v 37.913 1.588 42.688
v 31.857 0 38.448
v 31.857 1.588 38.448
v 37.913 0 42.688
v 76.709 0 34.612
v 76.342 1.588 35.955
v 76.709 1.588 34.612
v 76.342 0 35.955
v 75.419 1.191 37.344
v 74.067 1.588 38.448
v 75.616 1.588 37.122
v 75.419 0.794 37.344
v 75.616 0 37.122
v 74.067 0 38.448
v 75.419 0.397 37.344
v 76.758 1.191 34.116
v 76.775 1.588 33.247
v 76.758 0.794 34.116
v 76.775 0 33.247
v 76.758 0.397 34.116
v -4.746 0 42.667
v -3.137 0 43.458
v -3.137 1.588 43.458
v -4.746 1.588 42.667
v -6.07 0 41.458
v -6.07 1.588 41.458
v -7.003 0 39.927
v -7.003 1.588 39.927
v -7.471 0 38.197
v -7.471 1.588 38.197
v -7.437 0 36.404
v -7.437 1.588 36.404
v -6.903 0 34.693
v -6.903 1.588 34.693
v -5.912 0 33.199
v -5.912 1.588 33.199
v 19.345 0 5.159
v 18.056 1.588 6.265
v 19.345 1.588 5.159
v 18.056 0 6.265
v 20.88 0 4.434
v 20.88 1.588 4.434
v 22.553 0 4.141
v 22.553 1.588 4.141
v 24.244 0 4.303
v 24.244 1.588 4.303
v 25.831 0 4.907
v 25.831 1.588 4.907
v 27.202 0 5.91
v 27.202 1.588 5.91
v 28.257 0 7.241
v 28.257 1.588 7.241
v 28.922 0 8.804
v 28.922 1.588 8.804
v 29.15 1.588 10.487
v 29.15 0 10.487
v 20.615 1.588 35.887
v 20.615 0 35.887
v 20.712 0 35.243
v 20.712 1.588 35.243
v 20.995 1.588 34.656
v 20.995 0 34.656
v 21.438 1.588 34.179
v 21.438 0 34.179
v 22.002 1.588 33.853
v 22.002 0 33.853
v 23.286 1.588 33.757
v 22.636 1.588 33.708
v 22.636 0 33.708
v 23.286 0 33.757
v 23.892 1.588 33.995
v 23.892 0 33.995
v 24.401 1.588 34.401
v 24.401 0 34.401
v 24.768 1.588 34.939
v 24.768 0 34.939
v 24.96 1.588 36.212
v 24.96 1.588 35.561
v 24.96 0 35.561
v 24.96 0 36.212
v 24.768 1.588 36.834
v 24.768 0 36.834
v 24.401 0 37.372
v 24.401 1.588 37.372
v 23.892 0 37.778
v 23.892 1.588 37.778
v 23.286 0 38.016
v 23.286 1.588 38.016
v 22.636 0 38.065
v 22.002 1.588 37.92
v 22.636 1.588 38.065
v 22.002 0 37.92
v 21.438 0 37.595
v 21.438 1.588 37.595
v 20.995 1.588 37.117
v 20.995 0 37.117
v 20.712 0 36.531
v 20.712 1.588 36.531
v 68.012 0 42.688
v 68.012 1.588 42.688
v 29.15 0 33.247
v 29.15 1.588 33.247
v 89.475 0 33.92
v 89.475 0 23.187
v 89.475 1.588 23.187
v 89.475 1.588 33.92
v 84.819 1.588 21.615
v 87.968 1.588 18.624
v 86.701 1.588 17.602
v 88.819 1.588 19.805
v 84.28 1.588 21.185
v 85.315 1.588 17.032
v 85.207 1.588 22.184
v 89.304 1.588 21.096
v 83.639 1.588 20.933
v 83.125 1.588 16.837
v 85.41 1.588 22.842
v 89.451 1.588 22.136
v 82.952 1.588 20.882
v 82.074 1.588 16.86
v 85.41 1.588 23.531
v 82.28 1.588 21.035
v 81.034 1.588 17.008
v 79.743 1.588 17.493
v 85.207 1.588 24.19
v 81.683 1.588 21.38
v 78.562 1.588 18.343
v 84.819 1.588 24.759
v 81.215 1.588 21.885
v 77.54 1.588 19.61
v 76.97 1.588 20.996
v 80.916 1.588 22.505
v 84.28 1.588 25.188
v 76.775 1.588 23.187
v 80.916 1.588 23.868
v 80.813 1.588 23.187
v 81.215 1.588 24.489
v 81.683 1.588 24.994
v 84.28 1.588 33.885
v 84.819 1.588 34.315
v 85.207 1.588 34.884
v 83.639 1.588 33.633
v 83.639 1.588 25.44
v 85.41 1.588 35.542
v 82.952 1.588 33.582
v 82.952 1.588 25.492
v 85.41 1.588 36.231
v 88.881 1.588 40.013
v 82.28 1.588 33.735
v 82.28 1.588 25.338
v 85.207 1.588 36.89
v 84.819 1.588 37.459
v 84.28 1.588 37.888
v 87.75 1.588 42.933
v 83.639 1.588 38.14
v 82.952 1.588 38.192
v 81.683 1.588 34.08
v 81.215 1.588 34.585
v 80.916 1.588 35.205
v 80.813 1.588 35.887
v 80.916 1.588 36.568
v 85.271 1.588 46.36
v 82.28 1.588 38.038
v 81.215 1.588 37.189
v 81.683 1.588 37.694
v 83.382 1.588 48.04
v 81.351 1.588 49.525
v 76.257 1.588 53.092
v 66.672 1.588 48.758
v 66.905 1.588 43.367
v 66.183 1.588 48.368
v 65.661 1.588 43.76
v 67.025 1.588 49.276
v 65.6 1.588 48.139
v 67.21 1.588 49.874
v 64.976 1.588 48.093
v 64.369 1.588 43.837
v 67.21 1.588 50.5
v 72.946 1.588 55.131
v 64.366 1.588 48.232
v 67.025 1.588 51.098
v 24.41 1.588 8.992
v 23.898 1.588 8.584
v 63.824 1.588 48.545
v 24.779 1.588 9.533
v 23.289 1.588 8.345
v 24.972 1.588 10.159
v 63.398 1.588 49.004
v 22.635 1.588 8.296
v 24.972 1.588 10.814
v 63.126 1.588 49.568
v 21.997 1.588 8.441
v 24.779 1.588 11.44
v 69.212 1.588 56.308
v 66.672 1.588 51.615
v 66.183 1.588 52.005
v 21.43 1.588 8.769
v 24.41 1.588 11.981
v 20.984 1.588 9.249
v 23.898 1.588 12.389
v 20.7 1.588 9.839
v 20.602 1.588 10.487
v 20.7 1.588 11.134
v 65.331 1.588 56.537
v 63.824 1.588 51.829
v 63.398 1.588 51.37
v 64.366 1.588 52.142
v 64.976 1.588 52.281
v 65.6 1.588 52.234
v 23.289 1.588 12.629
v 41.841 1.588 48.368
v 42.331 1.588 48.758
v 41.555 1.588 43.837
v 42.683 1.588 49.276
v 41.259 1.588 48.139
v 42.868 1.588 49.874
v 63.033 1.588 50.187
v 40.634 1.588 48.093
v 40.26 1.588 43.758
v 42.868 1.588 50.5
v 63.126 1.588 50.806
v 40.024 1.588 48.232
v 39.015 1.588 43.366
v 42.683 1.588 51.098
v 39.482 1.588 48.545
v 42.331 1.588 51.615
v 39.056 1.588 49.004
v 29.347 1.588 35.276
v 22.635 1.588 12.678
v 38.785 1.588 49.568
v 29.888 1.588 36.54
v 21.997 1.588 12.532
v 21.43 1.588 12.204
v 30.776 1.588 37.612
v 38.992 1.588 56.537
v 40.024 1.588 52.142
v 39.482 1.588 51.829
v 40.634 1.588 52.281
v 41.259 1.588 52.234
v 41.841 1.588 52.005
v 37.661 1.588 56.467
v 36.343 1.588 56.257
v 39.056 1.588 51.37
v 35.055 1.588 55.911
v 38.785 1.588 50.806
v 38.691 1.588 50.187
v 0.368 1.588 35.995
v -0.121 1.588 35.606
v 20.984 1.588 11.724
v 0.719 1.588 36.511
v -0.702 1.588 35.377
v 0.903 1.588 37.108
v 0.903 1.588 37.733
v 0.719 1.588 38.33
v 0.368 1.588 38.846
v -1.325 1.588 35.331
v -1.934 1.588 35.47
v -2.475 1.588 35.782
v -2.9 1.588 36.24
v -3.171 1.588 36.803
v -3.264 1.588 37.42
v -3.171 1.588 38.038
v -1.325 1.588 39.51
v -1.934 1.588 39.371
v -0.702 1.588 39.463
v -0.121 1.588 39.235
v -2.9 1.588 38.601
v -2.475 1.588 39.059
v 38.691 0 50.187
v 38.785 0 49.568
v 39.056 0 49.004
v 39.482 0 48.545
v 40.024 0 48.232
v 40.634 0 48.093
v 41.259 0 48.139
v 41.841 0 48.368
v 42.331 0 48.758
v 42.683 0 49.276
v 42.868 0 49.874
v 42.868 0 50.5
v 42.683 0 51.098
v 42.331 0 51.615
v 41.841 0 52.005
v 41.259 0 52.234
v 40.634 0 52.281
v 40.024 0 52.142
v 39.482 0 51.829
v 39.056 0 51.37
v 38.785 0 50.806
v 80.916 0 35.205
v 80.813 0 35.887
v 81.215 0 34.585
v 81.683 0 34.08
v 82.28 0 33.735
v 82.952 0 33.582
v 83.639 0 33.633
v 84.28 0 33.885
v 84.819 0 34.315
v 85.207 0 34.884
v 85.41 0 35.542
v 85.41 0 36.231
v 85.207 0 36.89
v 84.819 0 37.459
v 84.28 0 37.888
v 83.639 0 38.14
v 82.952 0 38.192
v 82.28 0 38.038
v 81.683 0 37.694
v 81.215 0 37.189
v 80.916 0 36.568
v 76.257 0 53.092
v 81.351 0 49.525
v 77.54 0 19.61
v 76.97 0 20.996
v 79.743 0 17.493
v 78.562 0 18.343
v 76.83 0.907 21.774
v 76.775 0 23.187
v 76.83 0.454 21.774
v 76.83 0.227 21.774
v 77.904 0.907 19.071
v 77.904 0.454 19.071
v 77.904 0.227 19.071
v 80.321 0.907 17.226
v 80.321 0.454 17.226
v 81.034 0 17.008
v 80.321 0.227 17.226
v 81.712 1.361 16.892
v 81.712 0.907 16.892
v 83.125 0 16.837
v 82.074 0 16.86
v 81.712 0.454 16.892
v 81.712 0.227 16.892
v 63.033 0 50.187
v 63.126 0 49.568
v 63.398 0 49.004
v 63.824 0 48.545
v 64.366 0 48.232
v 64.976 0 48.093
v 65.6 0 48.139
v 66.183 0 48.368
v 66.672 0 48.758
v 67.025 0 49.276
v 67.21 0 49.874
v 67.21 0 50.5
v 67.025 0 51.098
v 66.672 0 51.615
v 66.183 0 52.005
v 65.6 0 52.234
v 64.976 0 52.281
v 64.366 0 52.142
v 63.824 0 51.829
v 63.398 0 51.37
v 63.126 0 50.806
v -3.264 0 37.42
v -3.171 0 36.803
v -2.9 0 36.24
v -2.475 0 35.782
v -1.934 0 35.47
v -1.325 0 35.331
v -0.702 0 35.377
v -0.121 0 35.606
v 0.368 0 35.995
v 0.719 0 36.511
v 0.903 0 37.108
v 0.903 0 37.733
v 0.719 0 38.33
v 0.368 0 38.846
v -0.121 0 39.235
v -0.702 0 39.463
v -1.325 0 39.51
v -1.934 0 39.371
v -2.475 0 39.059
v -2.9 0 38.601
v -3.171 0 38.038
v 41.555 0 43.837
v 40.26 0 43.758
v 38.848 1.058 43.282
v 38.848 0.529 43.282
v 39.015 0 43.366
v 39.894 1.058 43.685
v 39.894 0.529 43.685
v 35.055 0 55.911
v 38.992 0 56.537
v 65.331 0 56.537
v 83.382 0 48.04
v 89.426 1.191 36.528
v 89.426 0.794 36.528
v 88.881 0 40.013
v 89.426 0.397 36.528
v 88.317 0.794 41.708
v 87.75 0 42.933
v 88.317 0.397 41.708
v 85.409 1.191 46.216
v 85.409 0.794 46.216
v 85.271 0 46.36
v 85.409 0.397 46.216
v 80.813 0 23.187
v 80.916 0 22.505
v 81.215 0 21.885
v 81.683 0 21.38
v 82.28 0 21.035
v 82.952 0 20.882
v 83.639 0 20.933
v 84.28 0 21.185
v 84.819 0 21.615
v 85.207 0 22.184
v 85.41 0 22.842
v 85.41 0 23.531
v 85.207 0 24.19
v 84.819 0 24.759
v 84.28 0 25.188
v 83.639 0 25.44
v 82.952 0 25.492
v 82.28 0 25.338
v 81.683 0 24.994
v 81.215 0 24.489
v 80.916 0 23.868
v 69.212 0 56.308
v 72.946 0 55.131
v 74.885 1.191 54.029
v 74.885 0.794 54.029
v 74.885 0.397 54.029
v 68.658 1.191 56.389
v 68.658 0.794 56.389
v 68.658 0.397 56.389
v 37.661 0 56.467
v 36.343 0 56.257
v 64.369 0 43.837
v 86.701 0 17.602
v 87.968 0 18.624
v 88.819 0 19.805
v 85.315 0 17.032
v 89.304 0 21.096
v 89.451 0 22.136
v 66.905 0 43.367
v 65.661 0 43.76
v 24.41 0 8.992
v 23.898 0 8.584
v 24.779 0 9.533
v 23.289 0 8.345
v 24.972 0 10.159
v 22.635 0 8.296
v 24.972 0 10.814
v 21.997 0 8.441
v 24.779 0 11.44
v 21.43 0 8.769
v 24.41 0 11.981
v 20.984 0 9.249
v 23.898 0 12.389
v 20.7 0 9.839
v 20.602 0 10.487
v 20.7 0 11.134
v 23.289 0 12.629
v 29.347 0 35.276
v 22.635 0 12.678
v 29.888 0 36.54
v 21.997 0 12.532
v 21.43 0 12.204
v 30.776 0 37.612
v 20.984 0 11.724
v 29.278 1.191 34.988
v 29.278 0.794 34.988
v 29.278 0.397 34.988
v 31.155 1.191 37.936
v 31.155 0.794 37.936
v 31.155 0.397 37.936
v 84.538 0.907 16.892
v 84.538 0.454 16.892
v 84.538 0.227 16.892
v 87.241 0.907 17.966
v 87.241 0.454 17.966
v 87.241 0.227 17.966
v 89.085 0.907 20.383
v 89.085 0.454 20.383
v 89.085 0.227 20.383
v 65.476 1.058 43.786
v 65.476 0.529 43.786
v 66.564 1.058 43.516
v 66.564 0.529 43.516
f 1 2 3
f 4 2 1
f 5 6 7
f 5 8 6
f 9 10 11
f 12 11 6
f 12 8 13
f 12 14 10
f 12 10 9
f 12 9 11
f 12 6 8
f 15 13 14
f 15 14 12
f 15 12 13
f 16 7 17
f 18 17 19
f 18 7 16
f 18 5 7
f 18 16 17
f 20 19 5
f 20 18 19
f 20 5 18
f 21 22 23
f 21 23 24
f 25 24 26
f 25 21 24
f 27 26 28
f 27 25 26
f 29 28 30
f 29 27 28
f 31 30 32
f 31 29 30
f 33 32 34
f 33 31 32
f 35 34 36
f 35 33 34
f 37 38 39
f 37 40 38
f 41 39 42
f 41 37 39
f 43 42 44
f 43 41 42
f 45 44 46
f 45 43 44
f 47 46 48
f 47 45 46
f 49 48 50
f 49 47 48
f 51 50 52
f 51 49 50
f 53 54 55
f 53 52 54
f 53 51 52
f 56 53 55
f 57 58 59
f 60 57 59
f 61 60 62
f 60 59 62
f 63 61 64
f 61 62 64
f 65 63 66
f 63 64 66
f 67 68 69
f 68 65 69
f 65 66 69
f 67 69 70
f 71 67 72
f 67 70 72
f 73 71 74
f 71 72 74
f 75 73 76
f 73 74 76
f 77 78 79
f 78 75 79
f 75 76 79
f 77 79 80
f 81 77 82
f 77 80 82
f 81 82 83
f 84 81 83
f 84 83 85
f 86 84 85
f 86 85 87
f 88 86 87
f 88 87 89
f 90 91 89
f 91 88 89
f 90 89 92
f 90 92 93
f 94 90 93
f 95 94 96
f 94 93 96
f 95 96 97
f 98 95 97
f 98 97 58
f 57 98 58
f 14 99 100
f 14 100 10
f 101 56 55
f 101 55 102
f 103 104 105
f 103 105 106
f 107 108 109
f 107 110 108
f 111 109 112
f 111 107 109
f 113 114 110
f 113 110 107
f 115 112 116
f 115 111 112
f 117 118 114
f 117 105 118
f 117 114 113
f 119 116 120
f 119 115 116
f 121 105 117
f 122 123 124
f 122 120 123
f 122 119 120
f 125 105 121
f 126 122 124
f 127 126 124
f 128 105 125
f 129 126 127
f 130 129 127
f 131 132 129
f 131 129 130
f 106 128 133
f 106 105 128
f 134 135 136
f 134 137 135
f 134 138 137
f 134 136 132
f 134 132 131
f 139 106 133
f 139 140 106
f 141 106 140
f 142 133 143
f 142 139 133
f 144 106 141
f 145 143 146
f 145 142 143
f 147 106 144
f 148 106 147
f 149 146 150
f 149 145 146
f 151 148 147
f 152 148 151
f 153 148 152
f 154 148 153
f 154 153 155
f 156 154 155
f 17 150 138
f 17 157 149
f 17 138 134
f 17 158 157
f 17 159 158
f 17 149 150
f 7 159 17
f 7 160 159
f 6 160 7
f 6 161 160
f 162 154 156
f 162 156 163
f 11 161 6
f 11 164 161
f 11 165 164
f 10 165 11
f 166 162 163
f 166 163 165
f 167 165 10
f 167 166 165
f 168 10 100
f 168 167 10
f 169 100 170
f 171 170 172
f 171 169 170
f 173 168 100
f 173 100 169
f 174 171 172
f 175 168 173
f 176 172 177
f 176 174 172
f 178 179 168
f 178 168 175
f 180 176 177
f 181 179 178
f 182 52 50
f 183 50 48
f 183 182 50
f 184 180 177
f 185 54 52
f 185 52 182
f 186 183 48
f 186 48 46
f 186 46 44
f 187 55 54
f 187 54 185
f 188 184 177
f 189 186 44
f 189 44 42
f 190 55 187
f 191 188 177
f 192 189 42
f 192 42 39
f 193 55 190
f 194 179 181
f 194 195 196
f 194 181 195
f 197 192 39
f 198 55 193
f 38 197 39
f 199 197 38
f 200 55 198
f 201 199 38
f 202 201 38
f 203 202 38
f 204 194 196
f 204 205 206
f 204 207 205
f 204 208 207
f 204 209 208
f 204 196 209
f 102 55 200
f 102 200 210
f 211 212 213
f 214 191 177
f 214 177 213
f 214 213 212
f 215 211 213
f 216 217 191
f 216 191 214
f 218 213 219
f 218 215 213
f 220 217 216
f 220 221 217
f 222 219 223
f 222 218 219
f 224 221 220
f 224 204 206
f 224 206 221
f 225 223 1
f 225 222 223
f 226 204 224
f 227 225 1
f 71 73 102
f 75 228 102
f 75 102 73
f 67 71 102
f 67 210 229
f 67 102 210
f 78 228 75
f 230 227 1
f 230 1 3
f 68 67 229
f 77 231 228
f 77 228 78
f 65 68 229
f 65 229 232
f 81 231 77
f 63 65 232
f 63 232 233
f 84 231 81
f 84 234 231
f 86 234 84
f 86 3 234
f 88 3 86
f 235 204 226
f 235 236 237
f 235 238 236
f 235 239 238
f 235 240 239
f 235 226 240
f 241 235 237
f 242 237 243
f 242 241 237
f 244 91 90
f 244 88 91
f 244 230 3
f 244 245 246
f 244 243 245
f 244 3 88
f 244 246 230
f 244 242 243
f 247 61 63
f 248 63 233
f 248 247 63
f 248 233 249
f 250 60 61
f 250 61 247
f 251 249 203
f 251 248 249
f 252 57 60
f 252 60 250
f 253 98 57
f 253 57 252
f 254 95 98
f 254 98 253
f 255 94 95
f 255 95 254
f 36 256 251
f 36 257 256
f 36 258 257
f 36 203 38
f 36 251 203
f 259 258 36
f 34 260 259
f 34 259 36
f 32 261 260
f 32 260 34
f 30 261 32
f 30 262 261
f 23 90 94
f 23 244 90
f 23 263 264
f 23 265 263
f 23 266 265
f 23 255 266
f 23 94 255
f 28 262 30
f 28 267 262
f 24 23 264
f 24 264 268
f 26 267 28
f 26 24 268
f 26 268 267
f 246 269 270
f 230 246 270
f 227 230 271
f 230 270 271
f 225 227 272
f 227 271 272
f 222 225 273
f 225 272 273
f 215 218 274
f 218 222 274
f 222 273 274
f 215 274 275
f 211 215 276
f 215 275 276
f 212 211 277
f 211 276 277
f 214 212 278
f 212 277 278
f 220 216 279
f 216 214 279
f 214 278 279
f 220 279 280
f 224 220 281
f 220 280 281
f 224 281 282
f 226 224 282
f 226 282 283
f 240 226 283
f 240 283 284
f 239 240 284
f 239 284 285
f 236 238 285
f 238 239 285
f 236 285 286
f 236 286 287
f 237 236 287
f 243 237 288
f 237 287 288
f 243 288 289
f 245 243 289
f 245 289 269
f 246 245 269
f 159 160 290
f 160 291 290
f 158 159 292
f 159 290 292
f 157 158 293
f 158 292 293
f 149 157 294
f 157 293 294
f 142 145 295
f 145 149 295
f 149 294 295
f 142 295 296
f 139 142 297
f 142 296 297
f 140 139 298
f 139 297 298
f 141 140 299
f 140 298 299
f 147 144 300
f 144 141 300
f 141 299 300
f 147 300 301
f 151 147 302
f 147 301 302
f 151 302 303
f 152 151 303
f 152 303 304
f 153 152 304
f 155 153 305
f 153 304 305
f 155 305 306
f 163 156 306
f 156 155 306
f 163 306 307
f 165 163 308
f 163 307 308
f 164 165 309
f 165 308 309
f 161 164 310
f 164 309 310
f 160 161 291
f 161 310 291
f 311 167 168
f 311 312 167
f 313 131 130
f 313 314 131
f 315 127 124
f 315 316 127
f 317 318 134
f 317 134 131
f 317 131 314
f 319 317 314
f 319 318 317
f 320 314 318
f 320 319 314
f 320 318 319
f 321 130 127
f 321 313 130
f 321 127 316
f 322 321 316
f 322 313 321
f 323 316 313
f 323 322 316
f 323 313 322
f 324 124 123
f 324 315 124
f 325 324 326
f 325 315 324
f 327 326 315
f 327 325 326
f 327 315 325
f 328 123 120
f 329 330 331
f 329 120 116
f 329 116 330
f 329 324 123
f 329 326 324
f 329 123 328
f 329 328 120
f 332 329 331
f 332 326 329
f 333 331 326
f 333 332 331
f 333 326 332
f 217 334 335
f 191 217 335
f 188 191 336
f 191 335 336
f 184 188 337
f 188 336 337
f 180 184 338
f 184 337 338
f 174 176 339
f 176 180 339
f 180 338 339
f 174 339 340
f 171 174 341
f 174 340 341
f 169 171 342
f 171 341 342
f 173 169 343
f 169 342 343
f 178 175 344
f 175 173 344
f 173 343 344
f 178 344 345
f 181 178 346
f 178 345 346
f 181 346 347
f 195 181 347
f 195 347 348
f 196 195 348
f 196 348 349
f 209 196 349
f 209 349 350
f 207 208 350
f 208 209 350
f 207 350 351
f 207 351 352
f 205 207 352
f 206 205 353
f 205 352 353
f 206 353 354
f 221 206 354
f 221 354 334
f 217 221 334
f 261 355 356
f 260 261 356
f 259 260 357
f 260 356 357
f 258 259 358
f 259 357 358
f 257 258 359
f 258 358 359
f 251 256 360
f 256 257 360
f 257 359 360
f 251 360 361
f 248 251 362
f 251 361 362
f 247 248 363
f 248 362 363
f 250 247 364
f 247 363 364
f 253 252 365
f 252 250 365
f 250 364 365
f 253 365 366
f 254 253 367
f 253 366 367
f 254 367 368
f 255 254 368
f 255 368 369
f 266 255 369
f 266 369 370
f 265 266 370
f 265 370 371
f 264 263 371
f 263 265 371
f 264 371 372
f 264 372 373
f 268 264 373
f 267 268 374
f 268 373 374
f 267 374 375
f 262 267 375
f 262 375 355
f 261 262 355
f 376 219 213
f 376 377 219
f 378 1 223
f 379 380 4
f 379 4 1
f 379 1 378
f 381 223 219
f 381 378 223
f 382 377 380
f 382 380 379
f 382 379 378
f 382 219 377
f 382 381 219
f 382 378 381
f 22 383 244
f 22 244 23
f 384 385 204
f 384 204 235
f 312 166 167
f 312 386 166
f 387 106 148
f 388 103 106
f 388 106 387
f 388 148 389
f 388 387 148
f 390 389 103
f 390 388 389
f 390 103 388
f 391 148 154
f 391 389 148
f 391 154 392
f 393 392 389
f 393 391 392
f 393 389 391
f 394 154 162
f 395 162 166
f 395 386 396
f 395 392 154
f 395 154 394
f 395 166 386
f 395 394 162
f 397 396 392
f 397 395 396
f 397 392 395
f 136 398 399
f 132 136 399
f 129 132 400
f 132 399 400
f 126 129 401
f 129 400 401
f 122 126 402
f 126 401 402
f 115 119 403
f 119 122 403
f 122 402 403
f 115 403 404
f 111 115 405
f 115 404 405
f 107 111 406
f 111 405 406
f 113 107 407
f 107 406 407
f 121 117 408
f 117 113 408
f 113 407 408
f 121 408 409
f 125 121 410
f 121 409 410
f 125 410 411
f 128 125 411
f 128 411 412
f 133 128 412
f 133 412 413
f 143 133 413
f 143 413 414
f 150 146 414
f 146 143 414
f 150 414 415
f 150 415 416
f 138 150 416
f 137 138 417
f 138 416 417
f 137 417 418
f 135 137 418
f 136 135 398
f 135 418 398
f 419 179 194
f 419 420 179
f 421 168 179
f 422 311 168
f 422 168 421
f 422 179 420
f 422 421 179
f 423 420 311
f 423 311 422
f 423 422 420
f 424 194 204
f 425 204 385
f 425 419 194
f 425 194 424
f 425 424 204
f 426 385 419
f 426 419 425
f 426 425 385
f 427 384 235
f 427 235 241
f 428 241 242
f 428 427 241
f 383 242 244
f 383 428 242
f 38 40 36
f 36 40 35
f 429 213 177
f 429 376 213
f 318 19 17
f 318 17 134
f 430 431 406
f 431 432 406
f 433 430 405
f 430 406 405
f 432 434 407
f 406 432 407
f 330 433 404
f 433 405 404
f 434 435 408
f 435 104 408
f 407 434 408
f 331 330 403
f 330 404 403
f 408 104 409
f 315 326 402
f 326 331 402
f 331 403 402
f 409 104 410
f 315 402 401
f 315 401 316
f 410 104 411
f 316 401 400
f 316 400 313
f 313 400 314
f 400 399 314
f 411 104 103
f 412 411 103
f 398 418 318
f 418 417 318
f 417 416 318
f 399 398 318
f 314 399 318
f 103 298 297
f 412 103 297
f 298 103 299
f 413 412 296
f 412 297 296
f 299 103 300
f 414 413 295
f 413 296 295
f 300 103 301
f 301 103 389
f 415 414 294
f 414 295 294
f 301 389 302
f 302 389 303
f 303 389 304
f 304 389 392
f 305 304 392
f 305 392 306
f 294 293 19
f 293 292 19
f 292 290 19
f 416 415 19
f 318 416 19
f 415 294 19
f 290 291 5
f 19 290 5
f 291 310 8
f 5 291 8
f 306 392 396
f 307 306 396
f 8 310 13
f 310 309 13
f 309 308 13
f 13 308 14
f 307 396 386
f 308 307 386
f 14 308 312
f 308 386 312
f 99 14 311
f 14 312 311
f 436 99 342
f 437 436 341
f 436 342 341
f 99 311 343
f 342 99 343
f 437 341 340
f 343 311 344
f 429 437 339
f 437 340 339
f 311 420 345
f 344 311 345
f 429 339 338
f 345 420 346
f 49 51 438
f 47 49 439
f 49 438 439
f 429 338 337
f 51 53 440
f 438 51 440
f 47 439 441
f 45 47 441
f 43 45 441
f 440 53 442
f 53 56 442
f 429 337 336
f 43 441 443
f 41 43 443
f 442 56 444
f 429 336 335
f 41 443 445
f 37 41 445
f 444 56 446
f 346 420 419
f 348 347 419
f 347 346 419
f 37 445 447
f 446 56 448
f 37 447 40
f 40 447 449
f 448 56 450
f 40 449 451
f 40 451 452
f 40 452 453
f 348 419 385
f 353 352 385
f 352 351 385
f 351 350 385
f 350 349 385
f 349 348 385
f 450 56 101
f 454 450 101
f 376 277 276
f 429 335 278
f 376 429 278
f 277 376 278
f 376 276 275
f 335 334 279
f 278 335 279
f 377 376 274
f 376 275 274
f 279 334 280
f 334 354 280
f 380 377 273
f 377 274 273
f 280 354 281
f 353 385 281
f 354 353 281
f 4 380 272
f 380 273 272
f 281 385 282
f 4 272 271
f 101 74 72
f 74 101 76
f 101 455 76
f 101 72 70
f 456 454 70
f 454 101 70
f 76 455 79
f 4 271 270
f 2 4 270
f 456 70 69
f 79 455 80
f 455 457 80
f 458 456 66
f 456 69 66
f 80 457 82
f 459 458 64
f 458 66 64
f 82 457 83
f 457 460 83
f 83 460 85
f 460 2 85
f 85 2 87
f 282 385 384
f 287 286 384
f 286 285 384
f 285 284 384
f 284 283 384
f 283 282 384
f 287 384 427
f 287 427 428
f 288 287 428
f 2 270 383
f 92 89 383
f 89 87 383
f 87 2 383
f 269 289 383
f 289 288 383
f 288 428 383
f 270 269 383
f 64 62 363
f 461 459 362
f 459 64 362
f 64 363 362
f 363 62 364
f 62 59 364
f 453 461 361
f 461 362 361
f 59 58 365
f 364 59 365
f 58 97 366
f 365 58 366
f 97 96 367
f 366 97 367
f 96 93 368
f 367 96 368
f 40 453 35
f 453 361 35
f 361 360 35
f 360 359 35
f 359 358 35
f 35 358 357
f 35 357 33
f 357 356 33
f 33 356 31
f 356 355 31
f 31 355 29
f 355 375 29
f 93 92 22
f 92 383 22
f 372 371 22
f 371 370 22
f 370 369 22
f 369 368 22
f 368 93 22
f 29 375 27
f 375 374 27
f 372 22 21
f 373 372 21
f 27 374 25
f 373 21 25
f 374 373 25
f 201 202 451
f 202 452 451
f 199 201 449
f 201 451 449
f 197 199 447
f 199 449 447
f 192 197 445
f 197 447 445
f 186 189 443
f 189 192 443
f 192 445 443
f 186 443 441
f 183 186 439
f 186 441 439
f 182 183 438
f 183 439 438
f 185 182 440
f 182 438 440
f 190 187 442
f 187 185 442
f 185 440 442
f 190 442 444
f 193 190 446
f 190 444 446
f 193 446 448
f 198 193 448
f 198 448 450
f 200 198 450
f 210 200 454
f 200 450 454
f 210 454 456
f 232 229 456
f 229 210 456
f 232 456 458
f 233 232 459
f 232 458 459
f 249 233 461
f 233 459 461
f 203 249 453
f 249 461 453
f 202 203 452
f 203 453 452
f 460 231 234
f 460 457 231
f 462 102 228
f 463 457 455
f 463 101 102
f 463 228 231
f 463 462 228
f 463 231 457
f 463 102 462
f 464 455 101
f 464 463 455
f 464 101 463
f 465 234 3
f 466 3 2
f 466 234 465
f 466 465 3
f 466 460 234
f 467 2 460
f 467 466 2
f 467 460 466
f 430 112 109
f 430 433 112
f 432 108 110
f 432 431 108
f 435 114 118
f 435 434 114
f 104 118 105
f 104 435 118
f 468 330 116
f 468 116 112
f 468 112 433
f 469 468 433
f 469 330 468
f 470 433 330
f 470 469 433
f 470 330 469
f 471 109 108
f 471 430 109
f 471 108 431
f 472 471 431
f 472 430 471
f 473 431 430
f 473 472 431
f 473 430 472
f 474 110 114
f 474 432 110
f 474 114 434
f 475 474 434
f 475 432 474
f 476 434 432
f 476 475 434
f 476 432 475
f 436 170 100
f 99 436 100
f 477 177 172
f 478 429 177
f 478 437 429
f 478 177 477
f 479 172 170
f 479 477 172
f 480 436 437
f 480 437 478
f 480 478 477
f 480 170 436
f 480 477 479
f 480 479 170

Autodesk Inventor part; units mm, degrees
ref_plane "YZ Plane" through (0, 0, 0) normal (1, 0, 0) x (0, 1, 0)
ref_plane "XZ Plane" through (0, 0, 0) normal (0, 1, 0) x (-1, 0, 0)
ref_plane "XY Plane" through (0, 0, 0) normal (0, 0, 1) x (1, 0, 0)
sketch "Sketch1" plane through (0, 0, 0) normal (0, 1, 0) x (-1, 0, 0)
  circle A0 centre (-40.7913, 50.1867) radius 2.1
  circle A1 centre (-65.133, 50.1867) radius 2.1
  line L0 (-65.3307, 56.5367) -> (-38.9924, 56.5367)
  spline S0 degree 3 poles (-76.2574, 53.0916) (-75.8034, 53.4094) (-74.4464, 54.3628) (-71.9795, 55.7143) (-68.6599, 56.5178) (-66.439, 56.5367) (-65.3307, 56.5367) knots 0 0 0 0 0.147326 0.441978 0.73663 1.031282 1.031282 1.031282 1.031282
  spline S1 degree 3 poles (-89.4746, 33.9199) (-89.4746, 34.7907) (-89.485, 37.3864) (-88.662, 41.8159) (-85.6065, 46.4828) (-82.7779, 48.5258) (-81.3513, 49.5248) knots 0 0 0 0 0.176446 0.529337 0.882228 1.235119 1.235119 1.235119 1.235119
  line L1 (-81.3513, 49.5248) -> (-76.2574, 53.0916)
  line L2 (-89.4746, 23.1867) -> (-89.4746, 33.9199)
  spline S2 degree 3 poles (-83.1246, 16.8367) (-83.5996, 16.8367) (-84.5396, 16.8415) (-85.939, 17.1545) (-87.2739, 17.9007) (-88.4105, 19.0375) (-89.1576, 20.3727) (-89.4699, 21.7718) (-89.4746, 22.7117) (-89.4746, 23.1867) knots 0 0 0 0 0.123366 0.246731 0.370097 0.493463 0.616828 0.740194 0.86356 0.86356 0.86356 0.86356
  spline S3 degree 3 poles (-76.7746, 23.1867) (-76.7746, 22.7117) (-76.7794, 21.7718) (-77.0925, 20.3724) (-77.8386, 19.0375) (-78.9754, 17.9008) (-80.3107, 17.1538) (-81.7098, 16.8415) (-82.6497, 16.8367) (-83.1246, 16.8367) knots 0 0 0 0 0.123366 0.246731 0.370097 0.493463 0.616828 0.740194 0.86356 0.86356 0.86356 0.86356
  circle A2 centre (-83.1246, 23.1867) radius 2.3114
  circle A3 centre (-83.1246, 35.8867) radius 2.3114
  spline S4 degree 3 poles (-74.0669, 38.4483) (-74.5424, 38.1153) (-75.4851, 37.433) (-76.5038, 35.8783) (-76.7782, 34.4018) (-76.7746, 33.537) (-76.7746, 33.2467) knots 0 0 0 0 0.11763 0.235261 0.352891 0.411706 0.411706 0.411706 0.411706
  line L3 (-76.7746, 33.2467) -> (-76.7746, 23.1867)
  line L4 (-68.0115, 42.6883) -> (-74.0669, 38.4483)
  spline S5 degree 3 poles (-64.3693, 43.8367) (-64.7387, 43.8367) (-65.4747, 43.8285) (-66.7721, 43.5188) (-67.5576, 43.0062) (-68.0115, 42.6883) knots 0 0 0 0 0.098217 0.196435 0.343761 0.343761 0.343761 0.343761
  line L5 (-41.555, 43.8367) -> (-64.3693, 43.8367)
  spline S6 degree 3 poles (-37.9128, 42.6883) (-38.2154, 42.9002) (-38.823, 43.3156) (-40.0634, 43.806) (-41.0009, 43.8367) (-41.555, 43.8367) knots 0 0 0 0 0.098217 0.196435 0.343761 0.343761 0.343761 0.343761
  line L6 (-31.8574, 38.4483) -> (-37.9128, 42.6883)
  line L7 (-29.1496, 10.4867) -> (-29.1496, 33.2467)
  spline S7 degree 3 poles (-29.1496, 33.2467) (-29.1496, 33.8272) (-29.1679, 34.9915) (-29.8568, 36.7161) (-30.9093, 37.7887) (-31.6197, 38.2818) (-31.8574, 38.4483) knots 0 0 0 0 0.11763 0.235261 0.352891 0.411706 0.411706 0.411706 0.411706
  line L8 (-35.0553, 55.911) -> (3.1371, 43.4575)
  arc A4 (-35.0553, 55.911) -> (-38.9924, 56.5367) centre (-38.9924, 43.8367) ccw
  circle A5 centre (90.9711, -52.3822) radius 2.1844
  circle A6 centre (-22.7996, 35.8867) radius 2.1844
  circle A7 centre (1.1686, 37.4204) radius 2.0955
  arc A8 (5.9122, 33.199) -> (3.1371, 43.4575) centre (1.1686, 37.4204) ccw
  circle A9 centre (-22.7996, 10.4867) radius 2.1971 projected
  arc A10 (-29.1496, 10.4867) -> (-18.056, 6.2653) centre (-22.7996, 10.4867) ccw
  line L9 (-18.056, 6.2653) -> (5.9122, 33.199)
  point P0 (0, 0)
  point P1 (99.9514, -43.4019)
  point P2 (97.0418, -61.7217)
  dimension "d8" = 12.7
  dimension "d9" = 12.7
extrude "Extrusion1" add sketch "Sketch1" along normal blind 1.5875 contours L0 A4 L8 A8 L9 A10 L7 S7 L6 S6 L5 S5 L4 S4 L3 S3 S2 L2 S1 L1 S0
properties part number "funnel_gusset_full" material "Acetal Resin, Black"
